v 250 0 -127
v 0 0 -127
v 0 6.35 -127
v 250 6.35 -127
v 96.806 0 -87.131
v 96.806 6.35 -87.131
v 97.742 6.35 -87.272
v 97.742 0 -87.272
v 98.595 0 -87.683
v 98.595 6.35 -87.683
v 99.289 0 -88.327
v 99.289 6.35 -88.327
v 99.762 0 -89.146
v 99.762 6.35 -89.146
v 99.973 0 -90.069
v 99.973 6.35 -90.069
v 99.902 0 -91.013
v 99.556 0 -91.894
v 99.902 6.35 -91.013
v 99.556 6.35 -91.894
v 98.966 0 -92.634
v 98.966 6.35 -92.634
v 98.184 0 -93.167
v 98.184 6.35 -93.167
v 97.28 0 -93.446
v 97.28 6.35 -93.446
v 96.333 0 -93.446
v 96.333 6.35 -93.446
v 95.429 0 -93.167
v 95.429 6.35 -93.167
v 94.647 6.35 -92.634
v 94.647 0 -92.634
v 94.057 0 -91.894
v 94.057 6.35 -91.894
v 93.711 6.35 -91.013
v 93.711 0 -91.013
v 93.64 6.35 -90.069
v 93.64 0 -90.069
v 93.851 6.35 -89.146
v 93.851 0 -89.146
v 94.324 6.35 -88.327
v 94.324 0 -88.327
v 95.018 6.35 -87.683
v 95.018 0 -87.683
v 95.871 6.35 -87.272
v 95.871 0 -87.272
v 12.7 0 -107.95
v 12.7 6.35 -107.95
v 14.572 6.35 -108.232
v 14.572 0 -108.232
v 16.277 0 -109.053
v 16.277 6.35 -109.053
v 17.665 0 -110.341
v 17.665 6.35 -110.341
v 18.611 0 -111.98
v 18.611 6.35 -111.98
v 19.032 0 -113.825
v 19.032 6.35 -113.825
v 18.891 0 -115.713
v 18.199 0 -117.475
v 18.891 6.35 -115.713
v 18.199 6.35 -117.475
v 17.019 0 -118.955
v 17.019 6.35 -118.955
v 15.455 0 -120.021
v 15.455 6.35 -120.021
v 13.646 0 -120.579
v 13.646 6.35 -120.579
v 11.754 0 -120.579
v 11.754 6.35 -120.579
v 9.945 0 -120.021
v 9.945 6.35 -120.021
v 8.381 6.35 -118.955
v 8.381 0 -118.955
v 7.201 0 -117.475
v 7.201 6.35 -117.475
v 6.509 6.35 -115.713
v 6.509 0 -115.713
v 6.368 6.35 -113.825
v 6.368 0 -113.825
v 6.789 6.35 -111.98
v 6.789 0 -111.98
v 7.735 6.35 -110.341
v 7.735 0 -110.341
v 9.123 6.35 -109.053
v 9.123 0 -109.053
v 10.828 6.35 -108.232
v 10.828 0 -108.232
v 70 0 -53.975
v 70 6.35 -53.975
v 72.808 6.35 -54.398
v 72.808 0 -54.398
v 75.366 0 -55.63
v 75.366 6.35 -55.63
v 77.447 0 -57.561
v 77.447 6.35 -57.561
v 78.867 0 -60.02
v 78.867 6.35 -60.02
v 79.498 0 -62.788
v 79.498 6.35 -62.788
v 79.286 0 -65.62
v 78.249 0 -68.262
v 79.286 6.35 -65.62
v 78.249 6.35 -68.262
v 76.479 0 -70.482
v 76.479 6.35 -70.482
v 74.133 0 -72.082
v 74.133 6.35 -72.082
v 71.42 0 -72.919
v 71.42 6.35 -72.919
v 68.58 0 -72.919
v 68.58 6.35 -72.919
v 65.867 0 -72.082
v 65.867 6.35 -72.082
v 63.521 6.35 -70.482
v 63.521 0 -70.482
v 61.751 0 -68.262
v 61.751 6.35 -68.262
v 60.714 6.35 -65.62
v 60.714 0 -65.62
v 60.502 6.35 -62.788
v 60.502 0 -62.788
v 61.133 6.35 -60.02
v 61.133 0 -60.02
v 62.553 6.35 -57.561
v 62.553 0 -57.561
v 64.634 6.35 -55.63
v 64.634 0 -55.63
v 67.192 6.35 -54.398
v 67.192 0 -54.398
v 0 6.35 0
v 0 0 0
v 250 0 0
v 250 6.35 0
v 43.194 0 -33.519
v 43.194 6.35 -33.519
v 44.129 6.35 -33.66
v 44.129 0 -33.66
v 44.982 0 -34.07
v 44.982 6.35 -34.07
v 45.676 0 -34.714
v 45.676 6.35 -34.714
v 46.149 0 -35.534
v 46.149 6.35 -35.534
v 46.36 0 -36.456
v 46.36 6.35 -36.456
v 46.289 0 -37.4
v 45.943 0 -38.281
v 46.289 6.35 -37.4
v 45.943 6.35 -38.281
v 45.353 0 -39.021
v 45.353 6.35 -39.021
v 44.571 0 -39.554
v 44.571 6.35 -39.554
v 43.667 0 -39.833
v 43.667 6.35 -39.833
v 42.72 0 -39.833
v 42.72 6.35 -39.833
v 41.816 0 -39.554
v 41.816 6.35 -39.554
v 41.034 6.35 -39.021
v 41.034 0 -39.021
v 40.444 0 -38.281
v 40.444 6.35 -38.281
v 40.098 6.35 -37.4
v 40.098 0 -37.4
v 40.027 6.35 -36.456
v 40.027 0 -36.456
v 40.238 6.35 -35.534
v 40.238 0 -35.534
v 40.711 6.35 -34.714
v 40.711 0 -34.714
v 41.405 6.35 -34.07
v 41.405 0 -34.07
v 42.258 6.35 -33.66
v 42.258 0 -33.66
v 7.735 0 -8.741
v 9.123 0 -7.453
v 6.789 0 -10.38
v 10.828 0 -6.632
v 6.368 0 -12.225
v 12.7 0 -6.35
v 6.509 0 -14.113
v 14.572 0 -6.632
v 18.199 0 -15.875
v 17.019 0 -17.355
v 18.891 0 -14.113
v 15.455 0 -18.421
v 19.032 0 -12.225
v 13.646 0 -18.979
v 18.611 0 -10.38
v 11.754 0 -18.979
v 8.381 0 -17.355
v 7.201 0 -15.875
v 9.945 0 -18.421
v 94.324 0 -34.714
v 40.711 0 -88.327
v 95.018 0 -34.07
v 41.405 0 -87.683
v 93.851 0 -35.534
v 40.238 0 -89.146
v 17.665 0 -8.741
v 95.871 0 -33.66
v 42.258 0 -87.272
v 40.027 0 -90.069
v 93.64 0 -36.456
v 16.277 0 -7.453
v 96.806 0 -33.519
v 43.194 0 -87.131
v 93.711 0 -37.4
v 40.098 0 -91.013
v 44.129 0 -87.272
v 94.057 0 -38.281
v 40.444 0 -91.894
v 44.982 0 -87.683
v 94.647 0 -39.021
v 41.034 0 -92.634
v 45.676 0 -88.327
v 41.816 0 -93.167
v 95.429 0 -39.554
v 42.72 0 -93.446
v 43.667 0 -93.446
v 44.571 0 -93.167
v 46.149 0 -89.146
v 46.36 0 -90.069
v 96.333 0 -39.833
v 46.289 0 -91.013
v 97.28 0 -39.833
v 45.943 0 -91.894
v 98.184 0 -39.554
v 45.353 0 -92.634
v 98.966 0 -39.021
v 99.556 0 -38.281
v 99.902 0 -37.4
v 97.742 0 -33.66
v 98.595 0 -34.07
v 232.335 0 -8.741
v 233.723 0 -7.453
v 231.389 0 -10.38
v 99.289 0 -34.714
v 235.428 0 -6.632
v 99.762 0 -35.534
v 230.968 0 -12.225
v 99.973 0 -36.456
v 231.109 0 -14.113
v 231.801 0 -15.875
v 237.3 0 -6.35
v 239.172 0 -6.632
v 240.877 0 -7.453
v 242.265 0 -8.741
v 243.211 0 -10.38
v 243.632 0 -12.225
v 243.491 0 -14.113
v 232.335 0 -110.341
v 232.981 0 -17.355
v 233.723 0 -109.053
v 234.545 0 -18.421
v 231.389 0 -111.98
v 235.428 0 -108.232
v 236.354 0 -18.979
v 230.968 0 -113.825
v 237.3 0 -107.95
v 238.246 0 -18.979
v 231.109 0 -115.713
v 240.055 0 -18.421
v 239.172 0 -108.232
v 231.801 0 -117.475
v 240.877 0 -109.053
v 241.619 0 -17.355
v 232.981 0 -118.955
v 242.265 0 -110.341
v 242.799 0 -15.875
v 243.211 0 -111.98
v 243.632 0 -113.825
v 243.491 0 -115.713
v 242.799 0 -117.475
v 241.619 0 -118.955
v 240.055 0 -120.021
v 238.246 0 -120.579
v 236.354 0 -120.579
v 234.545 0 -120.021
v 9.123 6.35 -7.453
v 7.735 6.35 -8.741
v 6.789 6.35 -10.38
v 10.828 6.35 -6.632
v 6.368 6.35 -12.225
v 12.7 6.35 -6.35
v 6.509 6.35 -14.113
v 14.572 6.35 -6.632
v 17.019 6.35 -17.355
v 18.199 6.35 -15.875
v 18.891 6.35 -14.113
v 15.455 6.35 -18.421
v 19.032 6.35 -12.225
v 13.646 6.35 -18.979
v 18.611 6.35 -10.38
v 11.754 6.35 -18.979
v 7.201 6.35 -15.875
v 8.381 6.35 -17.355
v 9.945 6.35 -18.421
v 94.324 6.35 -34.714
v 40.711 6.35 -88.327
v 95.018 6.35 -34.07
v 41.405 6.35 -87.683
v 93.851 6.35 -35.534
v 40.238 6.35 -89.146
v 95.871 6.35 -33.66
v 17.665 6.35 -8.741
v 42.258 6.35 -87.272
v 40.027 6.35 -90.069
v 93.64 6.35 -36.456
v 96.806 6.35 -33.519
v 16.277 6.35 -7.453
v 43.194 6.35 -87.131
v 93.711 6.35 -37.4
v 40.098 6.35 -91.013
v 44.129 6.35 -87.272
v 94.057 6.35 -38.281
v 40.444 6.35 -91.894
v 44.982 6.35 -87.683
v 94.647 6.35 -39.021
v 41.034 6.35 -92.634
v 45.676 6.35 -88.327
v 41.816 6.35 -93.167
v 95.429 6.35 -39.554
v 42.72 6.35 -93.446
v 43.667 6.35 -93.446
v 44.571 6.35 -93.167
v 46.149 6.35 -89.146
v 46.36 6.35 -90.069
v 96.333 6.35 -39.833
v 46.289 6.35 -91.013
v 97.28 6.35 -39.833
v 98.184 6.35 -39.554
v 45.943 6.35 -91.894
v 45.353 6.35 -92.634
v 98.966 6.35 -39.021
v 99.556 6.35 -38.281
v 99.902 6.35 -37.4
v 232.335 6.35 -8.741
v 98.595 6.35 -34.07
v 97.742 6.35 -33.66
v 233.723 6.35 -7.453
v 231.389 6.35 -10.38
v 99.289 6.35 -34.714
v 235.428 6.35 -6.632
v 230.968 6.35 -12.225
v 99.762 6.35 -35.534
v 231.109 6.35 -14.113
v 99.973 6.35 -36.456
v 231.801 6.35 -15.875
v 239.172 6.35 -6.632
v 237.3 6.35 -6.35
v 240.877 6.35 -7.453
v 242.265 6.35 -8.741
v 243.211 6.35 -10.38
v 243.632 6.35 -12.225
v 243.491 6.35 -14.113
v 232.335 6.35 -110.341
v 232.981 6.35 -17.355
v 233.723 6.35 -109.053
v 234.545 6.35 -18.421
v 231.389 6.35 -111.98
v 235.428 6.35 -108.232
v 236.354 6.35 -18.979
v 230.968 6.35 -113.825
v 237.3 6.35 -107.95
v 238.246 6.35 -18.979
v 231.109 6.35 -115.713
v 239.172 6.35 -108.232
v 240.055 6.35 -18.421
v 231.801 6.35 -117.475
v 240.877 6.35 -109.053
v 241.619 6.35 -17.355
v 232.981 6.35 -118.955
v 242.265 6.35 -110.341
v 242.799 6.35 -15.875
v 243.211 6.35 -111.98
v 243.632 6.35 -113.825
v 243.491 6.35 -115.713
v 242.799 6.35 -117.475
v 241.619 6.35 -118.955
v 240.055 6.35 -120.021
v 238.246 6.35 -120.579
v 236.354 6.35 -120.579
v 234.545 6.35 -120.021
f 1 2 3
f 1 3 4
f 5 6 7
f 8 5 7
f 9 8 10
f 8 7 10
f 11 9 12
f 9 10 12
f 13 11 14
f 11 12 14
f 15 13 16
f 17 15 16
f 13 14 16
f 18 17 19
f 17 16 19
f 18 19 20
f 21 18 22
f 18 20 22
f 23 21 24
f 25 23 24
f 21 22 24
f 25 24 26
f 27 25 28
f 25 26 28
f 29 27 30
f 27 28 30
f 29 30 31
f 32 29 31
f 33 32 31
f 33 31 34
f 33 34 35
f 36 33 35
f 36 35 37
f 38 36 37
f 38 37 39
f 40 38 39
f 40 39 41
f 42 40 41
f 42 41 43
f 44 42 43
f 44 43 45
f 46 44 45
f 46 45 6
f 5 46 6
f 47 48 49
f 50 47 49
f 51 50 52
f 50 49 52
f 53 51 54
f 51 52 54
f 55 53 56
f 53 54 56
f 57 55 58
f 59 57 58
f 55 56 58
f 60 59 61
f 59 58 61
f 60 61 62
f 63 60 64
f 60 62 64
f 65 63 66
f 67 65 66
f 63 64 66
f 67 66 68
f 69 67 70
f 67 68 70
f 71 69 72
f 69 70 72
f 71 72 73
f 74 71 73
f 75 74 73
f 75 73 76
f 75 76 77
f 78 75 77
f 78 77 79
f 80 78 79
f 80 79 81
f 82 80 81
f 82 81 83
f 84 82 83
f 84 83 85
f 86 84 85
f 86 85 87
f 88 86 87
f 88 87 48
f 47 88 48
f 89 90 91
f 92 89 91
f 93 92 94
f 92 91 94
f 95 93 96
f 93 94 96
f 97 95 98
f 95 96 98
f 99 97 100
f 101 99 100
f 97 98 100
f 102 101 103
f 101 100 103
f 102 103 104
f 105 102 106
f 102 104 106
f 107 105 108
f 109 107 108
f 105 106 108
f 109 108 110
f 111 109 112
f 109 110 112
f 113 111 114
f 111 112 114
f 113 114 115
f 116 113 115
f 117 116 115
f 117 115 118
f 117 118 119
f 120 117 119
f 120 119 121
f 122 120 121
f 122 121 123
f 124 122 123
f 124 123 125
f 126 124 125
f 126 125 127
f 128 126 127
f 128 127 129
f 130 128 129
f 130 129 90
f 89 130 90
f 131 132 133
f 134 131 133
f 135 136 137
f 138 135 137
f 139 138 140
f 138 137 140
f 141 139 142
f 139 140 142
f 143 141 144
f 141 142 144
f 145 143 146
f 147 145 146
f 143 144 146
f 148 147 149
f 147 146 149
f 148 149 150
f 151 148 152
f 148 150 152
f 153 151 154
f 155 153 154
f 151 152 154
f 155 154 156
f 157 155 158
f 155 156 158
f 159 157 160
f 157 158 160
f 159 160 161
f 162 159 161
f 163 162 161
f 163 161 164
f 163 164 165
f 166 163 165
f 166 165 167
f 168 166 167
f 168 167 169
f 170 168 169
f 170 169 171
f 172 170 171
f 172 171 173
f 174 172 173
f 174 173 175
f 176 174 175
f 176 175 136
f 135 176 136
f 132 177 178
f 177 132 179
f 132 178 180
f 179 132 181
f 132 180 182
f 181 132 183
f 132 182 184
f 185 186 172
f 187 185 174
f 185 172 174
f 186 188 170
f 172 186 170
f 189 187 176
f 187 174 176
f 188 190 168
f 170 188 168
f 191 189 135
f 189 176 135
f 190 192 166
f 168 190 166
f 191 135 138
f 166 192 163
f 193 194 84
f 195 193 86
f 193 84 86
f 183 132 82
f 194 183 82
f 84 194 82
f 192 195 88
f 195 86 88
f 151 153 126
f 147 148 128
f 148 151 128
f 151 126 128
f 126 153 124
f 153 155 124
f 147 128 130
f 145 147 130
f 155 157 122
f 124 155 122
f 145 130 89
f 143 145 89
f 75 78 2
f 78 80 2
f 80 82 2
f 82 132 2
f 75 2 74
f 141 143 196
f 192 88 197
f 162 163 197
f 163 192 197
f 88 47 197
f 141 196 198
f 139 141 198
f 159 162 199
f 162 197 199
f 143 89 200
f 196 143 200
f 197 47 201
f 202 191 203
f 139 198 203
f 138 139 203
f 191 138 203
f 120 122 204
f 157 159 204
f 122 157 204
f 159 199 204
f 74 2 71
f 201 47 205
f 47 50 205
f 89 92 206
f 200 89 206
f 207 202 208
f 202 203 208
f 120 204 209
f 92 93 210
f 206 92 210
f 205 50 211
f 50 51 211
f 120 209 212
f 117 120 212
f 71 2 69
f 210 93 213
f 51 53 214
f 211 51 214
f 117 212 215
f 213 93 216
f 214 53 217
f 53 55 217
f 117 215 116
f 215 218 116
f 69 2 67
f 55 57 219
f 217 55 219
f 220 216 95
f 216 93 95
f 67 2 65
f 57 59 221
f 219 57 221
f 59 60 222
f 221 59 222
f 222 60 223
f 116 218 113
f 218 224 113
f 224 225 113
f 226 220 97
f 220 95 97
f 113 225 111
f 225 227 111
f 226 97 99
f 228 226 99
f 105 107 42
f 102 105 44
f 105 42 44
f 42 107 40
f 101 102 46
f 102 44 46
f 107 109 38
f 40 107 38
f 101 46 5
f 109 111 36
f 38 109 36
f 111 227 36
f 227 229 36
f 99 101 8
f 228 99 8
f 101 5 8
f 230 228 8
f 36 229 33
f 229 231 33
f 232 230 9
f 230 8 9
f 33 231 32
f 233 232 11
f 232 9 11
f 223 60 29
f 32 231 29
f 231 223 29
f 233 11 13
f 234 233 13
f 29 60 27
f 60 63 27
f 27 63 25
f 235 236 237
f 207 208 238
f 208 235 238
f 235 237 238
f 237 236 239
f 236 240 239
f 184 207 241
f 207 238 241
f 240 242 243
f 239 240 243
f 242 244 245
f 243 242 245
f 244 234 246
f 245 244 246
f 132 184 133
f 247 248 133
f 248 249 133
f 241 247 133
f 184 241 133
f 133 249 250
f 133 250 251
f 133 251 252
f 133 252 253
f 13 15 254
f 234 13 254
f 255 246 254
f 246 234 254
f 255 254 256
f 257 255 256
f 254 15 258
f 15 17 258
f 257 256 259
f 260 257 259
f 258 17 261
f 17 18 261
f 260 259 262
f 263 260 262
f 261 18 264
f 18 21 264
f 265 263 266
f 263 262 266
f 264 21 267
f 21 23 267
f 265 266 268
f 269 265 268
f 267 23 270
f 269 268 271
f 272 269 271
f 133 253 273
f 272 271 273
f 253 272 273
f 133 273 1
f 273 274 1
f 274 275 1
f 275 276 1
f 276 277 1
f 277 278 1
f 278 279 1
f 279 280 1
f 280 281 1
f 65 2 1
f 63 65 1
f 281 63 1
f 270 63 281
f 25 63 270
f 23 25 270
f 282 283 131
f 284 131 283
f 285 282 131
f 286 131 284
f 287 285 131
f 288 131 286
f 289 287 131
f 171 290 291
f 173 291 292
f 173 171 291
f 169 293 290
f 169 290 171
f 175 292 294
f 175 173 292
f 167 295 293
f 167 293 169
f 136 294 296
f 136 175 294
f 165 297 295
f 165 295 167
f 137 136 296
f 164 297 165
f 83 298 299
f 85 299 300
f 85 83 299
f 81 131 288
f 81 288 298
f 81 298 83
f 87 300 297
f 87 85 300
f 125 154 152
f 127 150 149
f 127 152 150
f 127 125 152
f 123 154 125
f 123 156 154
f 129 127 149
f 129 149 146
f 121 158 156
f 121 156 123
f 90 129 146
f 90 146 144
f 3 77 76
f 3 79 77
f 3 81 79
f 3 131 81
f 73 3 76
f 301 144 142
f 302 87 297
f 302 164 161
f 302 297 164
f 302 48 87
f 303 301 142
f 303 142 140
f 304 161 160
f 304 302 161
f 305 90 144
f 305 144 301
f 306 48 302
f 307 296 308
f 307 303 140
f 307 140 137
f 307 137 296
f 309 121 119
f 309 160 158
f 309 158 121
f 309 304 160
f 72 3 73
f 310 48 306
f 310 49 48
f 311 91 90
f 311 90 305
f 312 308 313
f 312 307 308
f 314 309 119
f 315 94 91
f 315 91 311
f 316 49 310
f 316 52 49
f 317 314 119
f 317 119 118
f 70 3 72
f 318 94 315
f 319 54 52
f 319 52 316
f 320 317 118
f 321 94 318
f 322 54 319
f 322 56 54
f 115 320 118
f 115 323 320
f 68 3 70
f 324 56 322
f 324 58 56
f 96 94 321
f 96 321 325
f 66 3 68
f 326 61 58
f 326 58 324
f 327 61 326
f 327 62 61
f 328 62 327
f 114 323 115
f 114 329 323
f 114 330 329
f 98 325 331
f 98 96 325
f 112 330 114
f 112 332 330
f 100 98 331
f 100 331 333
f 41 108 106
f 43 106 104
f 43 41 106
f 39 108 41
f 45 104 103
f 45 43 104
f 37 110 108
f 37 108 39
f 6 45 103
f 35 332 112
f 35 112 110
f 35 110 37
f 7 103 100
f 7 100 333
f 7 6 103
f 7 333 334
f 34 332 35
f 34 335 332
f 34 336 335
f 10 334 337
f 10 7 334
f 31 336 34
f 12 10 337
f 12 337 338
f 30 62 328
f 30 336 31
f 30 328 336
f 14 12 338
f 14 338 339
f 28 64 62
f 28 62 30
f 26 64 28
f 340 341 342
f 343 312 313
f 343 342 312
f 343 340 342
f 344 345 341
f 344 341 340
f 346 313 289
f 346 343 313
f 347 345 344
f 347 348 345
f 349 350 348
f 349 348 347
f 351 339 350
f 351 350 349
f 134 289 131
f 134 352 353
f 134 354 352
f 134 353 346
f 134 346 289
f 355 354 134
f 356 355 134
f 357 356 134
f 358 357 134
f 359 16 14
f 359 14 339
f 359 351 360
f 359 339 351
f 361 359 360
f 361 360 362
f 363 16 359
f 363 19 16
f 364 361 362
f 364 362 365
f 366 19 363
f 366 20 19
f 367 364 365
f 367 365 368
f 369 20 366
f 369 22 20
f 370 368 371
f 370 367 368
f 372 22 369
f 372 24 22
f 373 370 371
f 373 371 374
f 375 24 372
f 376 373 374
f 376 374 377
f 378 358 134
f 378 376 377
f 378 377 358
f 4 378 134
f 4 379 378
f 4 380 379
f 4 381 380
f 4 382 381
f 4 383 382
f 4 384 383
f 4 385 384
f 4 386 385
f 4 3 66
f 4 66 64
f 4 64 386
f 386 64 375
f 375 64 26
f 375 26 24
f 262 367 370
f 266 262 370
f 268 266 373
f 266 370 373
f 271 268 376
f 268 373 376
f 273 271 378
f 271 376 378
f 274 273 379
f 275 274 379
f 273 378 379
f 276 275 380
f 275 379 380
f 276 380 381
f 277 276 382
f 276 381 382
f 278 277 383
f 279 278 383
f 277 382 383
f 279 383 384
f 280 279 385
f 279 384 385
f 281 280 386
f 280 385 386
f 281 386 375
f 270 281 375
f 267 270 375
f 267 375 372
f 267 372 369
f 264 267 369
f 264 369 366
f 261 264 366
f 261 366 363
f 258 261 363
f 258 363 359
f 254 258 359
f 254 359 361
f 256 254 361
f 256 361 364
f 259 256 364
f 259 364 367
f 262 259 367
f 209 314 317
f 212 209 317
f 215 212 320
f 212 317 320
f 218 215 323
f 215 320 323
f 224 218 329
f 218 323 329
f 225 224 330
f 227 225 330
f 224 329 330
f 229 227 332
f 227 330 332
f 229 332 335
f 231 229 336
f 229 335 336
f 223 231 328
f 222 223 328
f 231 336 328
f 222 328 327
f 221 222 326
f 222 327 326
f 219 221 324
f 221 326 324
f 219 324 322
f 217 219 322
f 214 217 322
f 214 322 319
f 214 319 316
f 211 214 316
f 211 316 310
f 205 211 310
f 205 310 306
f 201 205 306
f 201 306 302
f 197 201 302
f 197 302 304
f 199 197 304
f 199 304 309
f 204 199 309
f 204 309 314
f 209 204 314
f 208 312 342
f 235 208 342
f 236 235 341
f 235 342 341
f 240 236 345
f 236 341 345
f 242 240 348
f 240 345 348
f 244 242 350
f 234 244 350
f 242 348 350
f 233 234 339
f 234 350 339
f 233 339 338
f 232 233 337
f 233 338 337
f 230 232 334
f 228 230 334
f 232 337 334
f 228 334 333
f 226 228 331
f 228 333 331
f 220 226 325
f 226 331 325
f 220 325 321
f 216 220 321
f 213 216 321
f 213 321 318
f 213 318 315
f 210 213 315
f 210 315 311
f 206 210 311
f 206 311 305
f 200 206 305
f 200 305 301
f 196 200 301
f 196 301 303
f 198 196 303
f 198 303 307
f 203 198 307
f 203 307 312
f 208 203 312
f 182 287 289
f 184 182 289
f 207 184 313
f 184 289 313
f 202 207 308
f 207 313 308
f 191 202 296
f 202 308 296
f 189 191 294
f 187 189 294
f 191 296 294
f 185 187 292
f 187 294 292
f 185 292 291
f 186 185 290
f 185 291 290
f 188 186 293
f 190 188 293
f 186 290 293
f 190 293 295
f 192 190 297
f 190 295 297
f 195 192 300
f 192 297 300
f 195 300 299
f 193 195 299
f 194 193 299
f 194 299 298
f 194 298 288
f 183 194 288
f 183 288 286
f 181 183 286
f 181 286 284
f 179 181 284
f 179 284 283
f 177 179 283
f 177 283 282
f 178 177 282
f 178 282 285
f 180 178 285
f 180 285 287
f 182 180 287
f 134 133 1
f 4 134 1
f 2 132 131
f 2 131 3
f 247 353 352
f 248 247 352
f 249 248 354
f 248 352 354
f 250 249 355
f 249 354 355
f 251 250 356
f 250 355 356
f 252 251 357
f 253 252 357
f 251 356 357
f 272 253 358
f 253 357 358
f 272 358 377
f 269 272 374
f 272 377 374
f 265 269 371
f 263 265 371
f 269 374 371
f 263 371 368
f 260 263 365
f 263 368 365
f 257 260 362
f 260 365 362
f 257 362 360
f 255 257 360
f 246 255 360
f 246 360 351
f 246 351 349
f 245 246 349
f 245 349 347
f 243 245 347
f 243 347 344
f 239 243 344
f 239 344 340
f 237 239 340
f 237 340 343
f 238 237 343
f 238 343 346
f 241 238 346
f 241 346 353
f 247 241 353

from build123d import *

# Parameters (mm, degrees)
SKETCH1_W           = 250
SKETCH1_H           = 127
BOSS_EXTRUDE1_DEPTH = 6.35
SKETCH2_R           = 6.35
SKETCH2_R_2         = 3.175
SKETCH2_R_3         = 9.525
CUT_EXTRUDE1_DEPTH  = 281.480520714


with BuildPart() as part:
    # Sketch1 → Boss-Extrude1 (new body)
    with BuildSketch(Plane(origin=(0, 0, 0), x_dir=(1, 0, 0), z_dir=(0, 1, 0))):
        with Locations((125, 63.5)):
            Rectangle(SKETCH1_W, SKETCH1_H)
    extrude(amount=BOSS_EXTRUDE1_DEPTH)

    # Sketch2 → Cut-Extrude1 (cut, through all)
    with BuildSketch(Plane(origin=(0, 6.35, 0), x_dir=(1, 0, 0), z_dir=(0, 1, 0))):
        with Locations(Location((237.3, 12.7, 0), (0, 0, 270))):
            Circle(SKETCH2_R)
        with Locations(Location((237.3, 114.3, 0), (0, 0, 270))):
            Circle(SKETCH2_R)
        with Locations(Location((12.7, 12.7, 0), (0, 0, 270))):
            Circle(SKETCH2_R)
        with Locations(Location((12.7, 114.3, 0), (0, 0, 270))):
            Circle(SKETCH2_R)
        with Locations(Location((43.193581925, 36.693581925, 0), (0, 0, 270))):
            Circle(SKETCH2_R_2)
        with Locations(Location((96.806418075, 36.693581925, 0), (0, 0, 270))):
            Circle(SKETCH2_R_2)
        with Locations(Location((96.806418075, 90.306418075, 0), (0, 0, 270))):
            Circle(SKETCH2_R_2)
        with Locations(Location((43.193581925, 90.306418075, 0), (0, 0, 270))):
            Circle(SKETCH2_R_2)
        with Locations(Location((70, 63.5, 0), (0, 0, 270))):
            Circle(SKETCH2_R_3)
    extrude(amount=-CUT_EXTRUDE1_DEPTH, mode=Mode.SUBTRACT)


solid = part.part
